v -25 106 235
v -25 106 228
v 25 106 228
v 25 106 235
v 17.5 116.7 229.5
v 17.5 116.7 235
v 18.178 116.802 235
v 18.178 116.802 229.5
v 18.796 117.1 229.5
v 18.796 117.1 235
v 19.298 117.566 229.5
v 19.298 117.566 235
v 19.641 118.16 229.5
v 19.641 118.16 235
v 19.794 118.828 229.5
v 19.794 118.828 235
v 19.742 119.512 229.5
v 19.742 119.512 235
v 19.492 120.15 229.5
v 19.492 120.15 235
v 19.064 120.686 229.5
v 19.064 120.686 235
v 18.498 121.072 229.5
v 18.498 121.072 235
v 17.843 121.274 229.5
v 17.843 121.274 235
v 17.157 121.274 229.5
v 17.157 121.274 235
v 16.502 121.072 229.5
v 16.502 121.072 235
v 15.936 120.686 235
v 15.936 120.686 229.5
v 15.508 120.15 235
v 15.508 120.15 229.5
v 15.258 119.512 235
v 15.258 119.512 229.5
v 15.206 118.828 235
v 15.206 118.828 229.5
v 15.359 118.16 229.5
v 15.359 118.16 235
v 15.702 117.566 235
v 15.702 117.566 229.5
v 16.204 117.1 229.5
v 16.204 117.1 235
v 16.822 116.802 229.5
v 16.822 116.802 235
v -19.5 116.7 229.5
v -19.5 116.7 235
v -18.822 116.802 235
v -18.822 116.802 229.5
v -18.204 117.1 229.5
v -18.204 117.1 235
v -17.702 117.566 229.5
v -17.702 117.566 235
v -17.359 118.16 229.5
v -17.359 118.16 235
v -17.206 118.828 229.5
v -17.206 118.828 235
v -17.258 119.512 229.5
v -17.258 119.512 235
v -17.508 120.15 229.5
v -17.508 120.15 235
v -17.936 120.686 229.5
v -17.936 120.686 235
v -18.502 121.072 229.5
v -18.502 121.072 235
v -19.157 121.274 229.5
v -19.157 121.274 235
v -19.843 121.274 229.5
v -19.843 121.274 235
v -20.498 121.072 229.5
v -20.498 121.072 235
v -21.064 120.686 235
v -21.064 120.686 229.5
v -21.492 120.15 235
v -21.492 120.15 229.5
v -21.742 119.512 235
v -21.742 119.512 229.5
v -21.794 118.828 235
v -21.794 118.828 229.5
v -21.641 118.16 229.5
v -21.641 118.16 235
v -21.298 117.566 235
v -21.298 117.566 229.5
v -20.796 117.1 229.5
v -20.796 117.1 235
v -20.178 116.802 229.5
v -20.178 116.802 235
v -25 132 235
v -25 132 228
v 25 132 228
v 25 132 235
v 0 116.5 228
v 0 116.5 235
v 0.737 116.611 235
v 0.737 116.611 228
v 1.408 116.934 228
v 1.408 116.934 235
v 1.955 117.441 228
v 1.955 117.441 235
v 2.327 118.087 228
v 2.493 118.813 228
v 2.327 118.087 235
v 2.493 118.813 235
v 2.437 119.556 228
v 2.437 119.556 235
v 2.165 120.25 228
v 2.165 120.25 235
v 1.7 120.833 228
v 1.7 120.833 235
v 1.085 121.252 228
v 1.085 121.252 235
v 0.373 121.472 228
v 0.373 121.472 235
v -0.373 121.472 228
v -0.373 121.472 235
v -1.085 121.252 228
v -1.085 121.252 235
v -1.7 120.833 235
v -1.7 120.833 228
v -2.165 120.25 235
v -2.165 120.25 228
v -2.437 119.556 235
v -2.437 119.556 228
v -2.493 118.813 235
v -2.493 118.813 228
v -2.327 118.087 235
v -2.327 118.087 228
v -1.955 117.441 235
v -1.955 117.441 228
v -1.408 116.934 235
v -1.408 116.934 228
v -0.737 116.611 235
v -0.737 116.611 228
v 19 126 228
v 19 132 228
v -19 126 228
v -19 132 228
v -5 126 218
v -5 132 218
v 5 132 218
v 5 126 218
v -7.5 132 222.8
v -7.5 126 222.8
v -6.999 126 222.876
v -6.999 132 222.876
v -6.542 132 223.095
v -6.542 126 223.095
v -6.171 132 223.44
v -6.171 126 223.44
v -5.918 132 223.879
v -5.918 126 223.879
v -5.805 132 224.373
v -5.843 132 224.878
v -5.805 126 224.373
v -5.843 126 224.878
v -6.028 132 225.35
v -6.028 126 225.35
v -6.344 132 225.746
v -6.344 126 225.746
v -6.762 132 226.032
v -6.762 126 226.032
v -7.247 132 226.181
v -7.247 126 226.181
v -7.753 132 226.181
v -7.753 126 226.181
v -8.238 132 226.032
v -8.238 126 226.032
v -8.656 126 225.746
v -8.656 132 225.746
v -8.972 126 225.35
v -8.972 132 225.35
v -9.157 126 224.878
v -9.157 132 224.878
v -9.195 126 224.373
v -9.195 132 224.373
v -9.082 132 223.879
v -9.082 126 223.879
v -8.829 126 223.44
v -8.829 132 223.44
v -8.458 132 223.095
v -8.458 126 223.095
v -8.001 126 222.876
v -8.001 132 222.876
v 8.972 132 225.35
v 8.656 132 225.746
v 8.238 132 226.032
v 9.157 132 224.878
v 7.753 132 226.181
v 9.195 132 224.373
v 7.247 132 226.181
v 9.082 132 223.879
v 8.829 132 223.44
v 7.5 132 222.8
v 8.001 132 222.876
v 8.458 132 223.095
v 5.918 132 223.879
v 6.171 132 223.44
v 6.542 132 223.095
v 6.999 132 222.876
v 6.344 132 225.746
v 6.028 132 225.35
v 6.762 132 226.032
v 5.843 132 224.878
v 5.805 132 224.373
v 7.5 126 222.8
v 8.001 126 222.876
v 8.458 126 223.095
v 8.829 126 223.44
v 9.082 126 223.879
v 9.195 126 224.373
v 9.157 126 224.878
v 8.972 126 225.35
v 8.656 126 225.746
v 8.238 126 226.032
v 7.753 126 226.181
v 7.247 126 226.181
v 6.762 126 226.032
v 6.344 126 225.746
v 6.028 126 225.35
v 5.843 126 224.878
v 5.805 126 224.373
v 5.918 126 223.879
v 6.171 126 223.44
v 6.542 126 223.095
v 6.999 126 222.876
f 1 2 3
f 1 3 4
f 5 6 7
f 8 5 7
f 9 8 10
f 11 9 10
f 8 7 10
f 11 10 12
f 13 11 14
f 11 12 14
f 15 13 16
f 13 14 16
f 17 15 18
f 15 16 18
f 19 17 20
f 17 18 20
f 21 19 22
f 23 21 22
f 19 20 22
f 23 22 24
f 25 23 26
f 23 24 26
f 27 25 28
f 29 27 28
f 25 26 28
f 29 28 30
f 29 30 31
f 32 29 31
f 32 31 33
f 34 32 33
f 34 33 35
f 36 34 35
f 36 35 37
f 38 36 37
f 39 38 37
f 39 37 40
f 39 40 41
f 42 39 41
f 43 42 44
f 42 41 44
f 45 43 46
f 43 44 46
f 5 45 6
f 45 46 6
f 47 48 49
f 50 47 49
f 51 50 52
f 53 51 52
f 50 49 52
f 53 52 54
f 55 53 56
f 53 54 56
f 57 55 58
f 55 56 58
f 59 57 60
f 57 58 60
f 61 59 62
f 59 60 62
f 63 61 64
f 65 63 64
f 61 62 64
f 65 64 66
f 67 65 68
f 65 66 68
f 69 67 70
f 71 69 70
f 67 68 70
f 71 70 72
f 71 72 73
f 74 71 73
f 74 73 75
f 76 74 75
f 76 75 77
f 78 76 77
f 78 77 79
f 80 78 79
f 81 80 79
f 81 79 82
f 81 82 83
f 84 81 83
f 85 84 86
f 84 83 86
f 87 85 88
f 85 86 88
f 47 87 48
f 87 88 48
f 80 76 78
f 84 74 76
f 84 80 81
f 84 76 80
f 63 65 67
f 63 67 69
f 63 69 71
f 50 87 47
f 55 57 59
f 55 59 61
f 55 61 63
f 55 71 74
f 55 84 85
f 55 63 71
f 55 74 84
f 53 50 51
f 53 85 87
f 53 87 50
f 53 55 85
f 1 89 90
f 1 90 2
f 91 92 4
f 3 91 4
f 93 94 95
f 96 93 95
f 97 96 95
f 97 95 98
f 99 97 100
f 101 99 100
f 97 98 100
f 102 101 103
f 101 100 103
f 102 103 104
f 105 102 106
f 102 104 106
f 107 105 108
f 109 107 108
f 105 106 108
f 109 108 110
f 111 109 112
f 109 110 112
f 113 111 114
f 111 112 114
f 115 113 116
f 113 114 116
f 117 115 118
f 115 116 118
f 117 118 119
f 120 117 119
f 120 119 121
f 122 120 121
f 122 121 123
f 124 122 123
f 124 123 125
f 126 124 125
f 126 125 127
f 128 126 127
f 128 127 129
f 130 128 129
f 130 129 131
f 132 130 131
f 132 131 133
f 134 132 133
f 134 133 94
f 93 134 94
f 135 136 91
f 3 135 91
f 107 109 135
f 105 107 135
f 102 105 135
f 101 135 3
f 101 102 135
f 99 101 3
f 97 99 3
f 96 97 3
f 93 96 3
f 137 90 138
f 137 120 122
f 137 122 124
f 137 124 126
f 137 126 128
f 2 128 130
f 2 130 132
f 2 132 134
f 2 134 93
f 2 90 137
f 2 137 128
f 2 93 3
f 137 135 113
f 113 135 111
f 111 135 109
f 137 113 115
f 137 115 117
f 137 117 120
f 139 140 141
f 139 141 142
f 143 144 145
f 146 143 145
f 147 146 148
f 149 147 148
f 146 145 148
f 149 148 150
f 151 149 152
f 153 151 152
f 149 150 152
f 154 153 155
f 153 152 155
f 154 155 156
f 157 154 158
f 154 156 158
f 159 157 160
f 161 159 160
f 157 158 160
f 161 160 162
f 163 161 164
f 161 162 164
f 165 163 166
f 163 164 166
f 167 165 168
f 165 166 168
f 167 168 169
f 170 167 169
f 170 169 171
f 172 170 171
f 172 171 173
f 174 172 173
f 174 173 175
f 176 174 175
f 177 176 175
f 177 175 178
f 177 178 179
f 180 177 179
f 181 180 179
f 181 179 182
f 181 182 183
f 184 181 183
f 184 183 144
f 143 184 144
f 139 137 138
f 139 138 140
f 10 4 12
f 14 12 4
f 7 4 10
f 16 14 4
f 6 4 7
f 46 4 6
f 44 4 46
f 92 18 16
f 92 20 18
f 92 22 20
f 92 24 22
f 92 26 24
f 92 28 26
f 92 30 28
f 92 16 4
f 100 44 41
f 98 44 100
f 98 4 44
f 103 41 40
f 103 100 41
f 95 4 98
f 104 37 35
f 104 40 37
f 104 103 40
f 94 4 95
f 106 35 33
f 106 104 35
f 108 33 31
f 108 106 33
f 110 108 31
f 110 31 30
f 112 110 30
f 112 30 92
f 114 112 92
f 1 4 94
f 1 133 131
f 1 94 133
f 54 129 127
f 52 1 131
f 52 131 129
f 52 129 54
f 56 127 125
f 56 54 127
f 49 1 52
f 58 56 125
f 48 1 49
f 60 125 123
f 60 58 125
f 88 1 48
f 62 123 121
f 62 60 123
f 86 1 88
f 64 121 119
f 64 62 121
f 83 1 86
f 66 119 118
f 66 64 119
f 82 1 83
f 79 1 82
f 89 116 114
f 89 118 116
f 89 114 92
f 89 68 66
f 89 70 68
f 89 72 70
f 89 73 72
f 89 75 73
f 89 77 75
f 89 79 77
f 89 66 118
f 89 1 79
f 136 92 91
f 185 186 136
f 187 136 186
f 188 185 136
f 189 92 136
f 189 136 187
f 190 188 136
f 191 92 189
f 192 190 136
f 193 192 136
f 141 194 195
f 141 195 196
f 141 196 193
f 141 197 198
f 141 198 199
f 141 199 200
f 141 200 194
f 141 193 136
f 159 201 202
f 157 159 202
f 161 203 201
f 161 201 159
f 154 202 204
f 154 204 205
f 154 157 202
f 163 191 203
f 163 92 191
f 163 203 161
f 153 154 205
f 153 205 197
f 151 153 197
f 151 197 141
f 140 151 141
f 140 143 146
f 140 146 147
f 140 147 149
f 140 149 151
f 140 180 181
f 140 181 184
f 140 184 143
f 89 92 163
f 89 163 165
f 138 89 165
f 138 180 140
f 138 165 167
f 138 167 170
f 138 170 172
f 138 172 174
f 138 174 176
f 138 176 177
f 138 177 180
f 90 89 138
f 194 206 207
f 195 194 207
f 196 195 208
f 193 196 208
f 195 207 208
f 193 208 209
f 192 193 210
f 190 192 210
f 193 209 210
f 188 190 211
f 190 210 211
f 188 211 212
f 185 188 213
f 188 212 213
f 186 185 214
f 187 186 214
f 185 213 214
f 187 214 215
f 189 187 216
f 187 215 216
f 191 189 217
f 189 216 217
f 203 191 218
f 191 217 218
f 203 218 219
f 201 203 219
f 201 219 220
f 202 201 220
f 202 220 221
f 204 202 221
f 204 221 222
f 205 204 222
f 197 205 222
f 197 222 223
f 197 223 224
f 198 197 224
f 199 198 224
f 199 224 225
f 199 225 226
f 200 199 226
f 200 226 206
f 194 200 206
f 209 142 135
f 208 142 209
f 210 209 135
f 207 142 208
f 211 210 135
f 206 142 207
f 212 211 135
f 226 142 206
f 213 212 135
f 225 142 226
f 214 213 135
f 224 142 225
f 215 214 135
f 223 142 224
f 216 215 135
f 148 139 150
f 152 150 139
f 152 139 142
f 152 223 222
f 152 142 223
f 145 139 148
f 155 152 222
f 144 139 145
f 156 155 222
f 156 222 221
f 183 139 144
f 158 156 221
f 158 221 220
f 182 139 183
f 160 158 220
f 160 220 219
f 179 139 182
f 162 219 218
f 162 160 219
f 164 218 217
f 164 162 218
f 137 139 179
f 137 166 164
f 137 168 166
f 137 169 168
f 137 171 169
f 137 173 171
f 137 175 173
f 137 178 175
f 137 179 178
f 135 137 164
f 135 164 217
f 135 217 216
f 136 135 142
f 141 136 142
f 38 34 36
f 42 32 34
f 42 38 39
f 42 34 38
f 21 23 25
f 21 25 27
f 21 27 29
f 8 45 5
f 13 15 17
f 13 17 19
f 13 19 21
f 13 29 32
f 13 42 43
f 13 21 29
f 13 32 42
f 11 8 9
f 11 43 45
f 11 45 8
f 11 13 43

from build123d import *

# Parameters (mm, degrees)
PAD039_DEPTH    = 50
POCKET035_DEPTH = 132.001
SKETCH113_R     = 2.3
POCKET036_DEPTH = 5.5
SKETCH114_R     = 1.7
HOLE022_DEPTH   = 25
SKETCH115_R     = 2.5
POCKET037_DEPTH = 17.001


with BuildPart() as part:
    # Sketch111 → Pad039 (new body)
    with BuildSketch(Plane.YZ):
        Polygon((106, 235), (132, 235), (132, 218), (126, 218), (126, 228), (106, 228), align=None)
    extrude(amount=PAD039_DEPTH)

    # Sketch112 → Pocket035 (cut, through all)
    with BuildSketch(Plane.XZ):
        Polygon((20, 218), (0, 218), (0, 228), (6, 228), align=None)
        Polygon((30, 218), (50, 218), (50, 228), (44, 228), align=None)
    extrude(amount=-POCKET035_DEPTH, mode=Mode.SUBTRACT)

    # Sketch113 (on Face1 of Pocket035) → Pocket036 (cut)
    with BuildSketch(Plane(origin=(0, 0, 235), x_dir=(0, -1, 0), z_dir=(0, 0, 1))):
        with Locations((-119, 42.5)):
            Circle(SKETCH113_R)
        with Locations((-119, 5.5)):
            Circle(SKETCH113_R)
    extrude(amount=-POCKET036_DEPTH, mode=Mode.SUBTRACT)

    # Sketch114 (on Face18 of Pocket036) → Hole022 (cut)
    with BuildSketch(Plane(origin=(0, 126, 0), x_dir=(0, 0, -1), z_dir=(0, -1, 0))):
        with Locations((-224.5, 32.5)):
            Circle(SKETCH114_R)
        with Locations((-224.5, 17.5)):
            Circle(SKETCH114_R)
    extrude(amount=-HOLE022_DEPTH, mode=Mode.SUBTRACT)

    # Sketch115 (on Face1 of Hole022) → Pocket037 (cut, through all)
    with BuildSketch(Plane(origin=(0, 0, 235), x_dir=(0, -1, 0), z_dir=(0, 0, 1))):
        with Locations((-119, 25)):
            Circle(SKETCH115_R)
    extrude(amount=-POCKET037_DEPTH, mode=Mode.SUBTRACT)


with BuildPart() as part_1:
    # Body016 placement: moved
    add(part.part.moved(Location((-25, 0, 0))))


solid = part_1.part
